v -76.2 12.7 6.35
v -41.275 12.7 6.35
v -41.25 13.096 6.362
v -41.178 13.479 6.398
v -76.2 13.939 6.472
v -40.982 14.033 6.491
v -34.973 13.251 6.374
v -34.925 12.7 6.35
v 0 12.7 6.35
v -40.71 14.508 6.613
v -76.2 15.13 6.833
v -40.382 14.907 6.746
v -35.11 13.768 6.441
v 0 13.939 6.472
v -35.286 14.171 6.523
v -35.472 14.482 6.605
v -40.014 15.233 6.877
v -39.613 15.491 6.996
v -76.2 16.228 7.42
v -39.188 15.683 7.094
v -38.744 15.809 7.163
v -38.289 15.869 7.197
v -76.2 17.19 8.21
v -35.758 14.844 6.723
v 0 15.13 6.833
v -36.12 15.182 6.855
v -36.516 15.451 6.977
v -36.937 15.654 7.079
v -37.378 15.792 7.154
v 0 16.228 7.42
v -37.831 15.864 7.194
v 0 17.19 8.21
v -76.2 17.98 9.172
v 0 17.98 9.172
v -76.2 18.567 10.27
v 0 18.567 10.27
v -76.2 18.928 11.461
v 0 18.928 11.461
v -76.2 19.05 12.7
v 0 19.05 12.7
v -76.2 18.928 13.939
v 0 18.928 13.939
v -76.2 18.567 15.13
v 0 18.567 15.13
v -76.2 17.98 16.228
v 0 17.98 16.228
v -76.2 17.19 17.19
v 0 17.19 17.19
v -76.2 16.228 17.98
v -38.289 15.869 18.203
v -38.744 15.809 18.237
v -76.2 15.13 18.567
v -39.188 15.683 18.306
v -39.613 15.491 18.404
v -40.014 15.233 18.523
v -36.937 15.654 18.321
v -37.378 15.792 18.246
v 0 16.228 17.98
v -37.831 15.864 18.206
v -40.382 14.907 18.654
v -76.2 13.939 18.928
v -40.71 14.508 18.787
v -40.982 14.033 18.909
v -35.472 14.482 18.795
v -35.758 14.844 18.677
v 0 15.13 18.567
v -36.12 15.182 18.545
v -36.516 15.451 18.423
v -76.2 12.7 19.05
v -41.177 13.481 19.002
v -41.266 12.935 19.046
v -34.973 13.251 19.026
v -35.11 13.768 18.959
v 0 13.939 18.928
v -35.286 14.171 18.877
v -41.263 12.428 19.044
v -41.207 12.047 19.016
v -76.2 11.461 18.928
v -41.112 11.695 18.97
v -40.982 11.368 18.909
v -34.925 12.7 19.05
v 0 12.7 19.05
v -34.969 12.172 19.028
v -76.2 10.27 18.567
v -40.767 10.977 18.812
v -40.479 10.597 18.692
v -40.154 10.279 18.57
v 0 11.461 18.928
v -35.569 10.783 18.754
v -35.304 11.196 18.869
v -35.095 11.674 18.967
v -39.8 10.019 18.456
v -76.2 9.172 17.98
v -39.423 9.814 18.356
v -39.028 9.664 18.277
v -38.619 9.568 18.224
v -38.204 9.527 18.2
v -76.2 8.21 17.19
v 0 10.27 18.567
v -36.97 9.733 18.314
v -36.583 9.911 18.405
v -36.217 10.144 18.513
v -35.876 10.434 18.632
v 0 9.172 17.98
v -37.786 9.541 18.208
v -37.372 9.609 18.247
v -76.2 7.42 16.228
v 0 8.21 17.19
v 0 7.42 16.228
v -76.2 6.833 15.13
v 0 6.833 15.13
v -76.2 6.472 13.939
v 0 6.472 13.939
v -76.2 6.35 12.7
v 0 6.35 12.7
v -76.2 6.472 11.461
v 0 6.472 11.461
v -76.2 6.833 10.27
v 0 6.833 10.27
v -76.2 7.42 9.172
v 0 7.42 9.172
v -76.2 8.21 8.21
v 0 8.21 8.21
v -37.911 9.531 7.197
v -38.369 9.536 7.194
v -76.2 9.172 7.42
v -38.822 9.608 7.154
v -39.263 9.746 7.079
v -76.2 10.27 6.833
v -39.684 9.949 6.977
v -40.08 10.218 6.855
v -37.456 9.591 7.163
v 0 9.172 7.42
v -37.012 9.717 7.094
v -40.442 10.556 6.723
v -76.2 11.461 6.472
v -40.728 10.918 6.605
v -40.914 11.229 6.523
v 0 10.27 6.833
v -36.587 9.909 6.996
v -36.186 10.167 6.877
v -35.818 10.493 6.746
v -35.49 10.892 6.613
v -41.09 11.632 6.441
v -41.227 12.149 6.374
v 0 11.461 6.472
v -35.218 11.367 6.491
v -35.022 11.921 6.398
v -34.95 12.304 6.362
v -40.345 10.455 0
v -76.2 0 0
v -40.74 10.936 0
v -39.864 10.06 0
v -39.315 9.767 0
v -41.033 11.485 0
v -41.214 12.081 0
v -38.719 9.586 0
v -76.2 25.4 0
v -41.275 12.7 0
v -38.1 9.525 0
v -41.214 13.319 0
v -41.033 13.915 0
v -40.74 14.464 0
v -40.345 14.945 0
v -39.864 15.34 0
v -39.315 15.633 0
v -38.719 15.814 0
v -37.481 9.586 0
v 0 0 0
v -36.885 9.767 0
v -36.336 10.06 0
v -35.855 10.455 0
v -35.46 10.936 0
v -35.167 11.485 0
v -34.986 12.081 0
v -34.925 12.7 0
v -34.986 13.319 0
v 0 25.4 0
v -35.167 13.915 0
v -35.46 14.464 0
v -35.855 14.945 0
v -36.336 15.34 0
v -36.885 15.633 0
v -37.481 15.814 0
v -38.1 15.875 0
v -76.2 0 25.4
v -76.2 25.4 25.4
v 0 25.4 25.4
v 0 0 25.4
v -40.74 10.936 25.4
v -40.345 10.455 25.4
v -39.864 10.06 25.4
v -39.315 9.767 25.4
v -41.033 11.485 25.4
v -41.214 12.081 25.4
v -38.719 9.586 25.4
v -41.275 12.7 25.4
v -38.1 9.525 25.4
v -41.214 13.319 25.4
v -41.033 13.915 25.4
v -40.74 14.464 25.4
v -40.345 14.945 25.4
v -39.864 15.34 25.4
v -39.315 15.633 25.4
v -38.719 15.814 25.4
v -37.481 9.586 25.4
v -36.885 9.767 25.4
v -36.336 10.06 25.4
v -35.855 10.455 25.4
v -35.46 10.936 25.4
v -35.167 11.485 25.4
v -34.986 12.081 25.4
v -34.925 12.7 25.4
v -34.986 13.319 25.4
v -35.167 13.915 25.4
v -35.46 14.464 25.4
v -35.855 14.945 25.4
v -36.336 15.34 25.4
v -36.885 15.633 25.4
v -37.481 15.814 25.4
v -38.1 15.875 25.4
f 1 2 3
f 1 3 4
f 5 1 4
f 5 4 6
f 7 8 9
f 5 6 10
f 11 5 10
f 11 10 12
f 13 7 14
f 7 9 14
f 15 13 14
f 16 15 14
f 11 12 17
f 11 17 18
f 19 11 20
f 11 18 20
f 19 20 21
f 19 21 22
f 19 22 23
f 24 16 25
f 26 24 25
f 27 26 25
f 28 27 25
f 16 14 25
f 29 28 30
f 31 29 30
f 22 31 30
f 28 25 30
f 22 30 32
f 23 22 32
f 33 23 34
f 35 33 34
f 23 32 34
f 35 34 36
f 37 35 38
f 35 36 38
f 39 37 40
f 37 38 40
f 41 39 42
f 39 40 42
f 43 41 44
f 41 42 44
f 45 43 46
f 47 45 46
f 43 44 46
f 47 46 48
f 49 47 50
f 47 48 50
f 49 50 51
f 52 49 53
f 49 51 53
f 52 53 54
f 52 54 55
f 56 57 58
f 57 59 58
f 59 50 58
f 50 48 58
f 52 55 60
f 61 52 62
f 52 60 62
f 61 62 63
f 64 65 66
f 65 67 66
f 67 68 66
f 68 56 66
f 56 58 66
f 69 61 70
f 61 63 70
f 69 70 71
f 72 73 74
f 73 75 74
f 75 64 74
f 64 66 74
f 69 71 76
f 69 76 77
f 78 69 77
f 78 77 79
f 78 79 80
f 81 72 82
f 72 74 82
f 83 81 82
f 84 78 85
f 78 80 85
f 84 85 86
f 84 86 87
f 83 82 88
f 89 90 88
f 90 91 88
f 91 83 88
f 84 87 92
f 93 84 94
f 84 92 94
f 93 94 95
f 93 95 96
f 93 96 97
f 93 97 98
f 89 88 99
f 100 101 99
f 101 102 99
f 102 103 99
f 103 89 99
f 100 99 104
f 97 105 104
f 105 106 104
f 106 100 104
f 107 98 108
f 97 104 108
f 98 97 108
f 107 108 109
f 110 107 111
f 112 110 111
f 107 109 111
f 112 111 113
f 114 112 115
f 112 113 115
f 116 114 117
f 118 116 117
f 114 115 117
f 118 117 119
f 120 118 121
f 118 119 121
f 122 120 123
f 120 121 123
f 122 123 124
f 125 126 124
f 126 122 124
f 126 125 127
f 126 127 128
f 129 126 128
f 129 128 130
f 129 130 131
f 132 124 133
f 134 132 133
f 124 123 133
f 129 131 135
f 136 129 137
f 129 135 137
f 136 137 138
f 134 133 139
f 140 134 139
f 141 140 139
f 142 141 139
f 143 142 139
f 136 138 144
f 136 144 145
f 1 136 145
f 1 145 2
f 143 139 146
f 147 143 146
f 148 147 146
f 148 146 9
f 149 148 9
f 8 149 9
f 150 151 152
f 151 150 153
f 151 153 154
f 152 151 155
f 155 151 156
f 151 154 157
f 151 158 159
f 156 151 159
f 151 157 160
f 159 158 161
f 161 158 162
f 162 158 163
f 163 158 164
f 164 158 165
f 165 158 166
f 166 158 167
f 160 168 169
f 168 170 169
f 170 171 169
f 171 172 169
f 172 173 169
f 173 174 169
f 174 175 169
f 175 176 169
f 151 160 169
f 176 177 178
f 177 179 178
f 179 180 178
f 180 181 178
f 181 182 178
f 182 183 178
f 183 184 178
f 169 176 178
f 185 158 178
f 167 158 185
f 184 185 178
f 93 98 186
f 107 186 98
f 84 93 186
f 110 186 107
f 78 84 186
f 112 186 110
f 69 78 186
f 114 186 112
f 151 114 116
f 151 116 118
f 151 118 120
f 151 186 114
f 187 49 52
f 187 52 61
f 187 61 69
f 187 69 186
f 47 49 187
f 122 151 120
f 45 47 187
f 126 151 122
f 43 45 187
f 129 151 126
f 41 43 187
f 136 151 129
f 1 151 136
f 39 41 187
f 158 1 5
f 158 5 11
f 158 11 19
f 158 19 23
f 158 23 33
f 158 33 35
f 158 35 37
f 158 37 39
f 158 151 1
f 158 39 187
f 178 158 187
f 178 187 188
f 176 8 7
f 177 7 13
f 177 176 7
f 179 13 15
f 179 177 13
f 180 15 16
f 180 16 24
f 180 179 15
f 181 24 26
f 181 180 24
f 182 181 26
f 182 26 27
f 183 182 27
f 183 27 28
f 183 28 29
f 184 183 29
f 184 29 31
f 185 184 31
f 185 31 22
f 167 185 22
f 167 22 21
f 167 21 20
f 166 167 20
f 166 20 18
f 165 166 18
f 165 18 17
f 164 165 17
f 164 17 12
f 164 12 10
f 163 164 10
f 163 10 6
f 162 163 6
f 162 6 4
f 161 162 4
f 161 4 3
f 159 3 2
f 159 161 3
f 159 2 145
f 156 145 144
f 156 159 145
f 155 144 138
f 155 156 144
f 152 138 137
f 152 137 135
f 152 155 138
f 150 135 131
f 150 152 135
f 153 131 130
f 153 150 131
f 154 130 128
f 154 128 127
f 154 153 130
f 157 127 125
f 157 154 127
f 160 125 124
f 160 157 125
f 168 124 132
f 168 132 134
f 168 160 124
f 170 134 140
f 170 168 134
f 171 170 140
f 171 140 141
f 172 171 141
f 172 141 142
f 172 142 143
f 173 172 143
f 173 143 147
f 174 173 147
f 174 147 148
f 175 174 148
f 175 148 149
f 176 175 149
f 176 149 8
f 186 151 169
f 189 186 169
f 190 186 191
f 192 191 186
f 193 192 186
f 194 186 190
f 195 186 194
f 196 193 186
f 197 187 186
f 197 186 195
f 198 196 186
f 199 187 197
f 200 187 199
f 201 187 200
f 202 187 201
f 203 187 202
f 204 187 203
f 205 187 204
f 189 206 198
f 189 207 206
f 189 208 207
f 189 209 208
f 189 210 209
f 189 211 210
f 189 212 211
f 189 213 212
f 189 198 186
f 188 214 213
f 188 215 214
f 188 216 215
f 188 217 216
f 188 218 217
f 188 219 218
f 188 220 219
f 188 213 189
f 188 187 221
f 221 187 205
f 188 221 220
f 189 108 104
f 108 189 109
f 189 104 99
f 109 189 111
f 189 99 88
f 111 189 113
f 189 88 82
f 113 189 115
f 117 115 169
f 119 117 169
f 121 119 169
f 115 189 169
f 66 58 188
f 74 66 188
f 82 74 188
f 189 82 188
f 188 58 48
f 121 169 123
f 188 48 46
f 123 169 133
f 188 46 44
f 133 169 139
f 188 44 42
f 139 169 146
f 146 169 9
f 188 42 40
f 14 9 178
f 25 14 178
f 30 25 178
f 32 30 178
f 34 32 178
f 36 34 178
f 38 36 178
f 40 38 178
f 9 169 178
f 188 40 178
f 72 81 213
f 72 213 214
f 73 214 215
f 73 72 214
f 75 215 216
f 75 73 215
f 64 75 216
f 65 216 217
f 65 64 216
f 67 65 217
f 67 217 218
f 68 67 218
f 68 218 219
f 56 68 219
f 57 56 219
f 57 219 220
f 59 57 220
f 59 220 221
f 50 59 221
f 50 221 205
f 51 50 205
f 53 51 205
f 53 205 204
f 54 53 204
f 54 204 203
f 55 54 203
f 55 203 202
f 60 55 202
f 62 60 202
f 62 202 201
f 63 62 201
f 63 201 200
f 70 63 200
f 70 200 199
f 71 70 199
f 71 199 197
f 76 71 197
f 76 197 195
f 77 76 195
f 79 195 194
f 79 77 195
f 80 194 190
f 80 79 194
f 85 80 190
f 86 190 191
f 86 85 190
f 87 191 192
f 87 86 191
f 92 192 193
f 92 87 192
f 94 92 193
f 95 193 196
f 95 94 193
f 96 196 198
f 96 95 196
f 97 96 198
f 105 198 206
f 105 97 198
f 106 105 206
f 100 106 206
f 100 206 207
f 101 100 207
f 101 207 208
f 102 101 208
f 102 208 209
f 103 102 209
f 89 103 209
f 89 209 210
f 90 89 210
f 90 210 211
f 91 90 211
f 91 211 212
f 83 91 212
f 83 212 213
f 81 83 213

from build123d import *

# Parameters (mm, degrees)
SKETCH1_W           = 76.2
SKETCH1_H           = 25.4
SKETCH1_R           = 3.175
BOSS_EXTRUDE1_DEPTH = 25.4
SKETCH2_R           = 6.35
CUT_EXTRUDE1_DEPTH  = 85.242269675


with BuildPart() as part:
    # Sketch1 → Boss-Extrude1 (new body)
    with BuildSketch(Plane.XY):
        with Locations((-38.1, 12.7)):
            Rectangle(SKETCH1_W, SKETCH1_H)
        with Locations((-38.1, 12.7)):
            Circle(SKETCH1_R, mode=Mode.SUBTRACT)
    extrude(amount=BOSS_EXTRUDE1_DEPTH)

    # Sketch2 → Cut-Extrude1 (cut, through all)
    with BuildSketch(Plane(origin=(0, 0, 0), x_dir=(0, 0, -1), z_dir=(1, 0, 0))):
        with Locations((-12.7, 12.7)):
            Circle(SKETCH2_R)
    extrude(amount=-CUT_EXTRUDE1_DEPTH, mode=Mode.SUBTRACT)


solid = part.part
